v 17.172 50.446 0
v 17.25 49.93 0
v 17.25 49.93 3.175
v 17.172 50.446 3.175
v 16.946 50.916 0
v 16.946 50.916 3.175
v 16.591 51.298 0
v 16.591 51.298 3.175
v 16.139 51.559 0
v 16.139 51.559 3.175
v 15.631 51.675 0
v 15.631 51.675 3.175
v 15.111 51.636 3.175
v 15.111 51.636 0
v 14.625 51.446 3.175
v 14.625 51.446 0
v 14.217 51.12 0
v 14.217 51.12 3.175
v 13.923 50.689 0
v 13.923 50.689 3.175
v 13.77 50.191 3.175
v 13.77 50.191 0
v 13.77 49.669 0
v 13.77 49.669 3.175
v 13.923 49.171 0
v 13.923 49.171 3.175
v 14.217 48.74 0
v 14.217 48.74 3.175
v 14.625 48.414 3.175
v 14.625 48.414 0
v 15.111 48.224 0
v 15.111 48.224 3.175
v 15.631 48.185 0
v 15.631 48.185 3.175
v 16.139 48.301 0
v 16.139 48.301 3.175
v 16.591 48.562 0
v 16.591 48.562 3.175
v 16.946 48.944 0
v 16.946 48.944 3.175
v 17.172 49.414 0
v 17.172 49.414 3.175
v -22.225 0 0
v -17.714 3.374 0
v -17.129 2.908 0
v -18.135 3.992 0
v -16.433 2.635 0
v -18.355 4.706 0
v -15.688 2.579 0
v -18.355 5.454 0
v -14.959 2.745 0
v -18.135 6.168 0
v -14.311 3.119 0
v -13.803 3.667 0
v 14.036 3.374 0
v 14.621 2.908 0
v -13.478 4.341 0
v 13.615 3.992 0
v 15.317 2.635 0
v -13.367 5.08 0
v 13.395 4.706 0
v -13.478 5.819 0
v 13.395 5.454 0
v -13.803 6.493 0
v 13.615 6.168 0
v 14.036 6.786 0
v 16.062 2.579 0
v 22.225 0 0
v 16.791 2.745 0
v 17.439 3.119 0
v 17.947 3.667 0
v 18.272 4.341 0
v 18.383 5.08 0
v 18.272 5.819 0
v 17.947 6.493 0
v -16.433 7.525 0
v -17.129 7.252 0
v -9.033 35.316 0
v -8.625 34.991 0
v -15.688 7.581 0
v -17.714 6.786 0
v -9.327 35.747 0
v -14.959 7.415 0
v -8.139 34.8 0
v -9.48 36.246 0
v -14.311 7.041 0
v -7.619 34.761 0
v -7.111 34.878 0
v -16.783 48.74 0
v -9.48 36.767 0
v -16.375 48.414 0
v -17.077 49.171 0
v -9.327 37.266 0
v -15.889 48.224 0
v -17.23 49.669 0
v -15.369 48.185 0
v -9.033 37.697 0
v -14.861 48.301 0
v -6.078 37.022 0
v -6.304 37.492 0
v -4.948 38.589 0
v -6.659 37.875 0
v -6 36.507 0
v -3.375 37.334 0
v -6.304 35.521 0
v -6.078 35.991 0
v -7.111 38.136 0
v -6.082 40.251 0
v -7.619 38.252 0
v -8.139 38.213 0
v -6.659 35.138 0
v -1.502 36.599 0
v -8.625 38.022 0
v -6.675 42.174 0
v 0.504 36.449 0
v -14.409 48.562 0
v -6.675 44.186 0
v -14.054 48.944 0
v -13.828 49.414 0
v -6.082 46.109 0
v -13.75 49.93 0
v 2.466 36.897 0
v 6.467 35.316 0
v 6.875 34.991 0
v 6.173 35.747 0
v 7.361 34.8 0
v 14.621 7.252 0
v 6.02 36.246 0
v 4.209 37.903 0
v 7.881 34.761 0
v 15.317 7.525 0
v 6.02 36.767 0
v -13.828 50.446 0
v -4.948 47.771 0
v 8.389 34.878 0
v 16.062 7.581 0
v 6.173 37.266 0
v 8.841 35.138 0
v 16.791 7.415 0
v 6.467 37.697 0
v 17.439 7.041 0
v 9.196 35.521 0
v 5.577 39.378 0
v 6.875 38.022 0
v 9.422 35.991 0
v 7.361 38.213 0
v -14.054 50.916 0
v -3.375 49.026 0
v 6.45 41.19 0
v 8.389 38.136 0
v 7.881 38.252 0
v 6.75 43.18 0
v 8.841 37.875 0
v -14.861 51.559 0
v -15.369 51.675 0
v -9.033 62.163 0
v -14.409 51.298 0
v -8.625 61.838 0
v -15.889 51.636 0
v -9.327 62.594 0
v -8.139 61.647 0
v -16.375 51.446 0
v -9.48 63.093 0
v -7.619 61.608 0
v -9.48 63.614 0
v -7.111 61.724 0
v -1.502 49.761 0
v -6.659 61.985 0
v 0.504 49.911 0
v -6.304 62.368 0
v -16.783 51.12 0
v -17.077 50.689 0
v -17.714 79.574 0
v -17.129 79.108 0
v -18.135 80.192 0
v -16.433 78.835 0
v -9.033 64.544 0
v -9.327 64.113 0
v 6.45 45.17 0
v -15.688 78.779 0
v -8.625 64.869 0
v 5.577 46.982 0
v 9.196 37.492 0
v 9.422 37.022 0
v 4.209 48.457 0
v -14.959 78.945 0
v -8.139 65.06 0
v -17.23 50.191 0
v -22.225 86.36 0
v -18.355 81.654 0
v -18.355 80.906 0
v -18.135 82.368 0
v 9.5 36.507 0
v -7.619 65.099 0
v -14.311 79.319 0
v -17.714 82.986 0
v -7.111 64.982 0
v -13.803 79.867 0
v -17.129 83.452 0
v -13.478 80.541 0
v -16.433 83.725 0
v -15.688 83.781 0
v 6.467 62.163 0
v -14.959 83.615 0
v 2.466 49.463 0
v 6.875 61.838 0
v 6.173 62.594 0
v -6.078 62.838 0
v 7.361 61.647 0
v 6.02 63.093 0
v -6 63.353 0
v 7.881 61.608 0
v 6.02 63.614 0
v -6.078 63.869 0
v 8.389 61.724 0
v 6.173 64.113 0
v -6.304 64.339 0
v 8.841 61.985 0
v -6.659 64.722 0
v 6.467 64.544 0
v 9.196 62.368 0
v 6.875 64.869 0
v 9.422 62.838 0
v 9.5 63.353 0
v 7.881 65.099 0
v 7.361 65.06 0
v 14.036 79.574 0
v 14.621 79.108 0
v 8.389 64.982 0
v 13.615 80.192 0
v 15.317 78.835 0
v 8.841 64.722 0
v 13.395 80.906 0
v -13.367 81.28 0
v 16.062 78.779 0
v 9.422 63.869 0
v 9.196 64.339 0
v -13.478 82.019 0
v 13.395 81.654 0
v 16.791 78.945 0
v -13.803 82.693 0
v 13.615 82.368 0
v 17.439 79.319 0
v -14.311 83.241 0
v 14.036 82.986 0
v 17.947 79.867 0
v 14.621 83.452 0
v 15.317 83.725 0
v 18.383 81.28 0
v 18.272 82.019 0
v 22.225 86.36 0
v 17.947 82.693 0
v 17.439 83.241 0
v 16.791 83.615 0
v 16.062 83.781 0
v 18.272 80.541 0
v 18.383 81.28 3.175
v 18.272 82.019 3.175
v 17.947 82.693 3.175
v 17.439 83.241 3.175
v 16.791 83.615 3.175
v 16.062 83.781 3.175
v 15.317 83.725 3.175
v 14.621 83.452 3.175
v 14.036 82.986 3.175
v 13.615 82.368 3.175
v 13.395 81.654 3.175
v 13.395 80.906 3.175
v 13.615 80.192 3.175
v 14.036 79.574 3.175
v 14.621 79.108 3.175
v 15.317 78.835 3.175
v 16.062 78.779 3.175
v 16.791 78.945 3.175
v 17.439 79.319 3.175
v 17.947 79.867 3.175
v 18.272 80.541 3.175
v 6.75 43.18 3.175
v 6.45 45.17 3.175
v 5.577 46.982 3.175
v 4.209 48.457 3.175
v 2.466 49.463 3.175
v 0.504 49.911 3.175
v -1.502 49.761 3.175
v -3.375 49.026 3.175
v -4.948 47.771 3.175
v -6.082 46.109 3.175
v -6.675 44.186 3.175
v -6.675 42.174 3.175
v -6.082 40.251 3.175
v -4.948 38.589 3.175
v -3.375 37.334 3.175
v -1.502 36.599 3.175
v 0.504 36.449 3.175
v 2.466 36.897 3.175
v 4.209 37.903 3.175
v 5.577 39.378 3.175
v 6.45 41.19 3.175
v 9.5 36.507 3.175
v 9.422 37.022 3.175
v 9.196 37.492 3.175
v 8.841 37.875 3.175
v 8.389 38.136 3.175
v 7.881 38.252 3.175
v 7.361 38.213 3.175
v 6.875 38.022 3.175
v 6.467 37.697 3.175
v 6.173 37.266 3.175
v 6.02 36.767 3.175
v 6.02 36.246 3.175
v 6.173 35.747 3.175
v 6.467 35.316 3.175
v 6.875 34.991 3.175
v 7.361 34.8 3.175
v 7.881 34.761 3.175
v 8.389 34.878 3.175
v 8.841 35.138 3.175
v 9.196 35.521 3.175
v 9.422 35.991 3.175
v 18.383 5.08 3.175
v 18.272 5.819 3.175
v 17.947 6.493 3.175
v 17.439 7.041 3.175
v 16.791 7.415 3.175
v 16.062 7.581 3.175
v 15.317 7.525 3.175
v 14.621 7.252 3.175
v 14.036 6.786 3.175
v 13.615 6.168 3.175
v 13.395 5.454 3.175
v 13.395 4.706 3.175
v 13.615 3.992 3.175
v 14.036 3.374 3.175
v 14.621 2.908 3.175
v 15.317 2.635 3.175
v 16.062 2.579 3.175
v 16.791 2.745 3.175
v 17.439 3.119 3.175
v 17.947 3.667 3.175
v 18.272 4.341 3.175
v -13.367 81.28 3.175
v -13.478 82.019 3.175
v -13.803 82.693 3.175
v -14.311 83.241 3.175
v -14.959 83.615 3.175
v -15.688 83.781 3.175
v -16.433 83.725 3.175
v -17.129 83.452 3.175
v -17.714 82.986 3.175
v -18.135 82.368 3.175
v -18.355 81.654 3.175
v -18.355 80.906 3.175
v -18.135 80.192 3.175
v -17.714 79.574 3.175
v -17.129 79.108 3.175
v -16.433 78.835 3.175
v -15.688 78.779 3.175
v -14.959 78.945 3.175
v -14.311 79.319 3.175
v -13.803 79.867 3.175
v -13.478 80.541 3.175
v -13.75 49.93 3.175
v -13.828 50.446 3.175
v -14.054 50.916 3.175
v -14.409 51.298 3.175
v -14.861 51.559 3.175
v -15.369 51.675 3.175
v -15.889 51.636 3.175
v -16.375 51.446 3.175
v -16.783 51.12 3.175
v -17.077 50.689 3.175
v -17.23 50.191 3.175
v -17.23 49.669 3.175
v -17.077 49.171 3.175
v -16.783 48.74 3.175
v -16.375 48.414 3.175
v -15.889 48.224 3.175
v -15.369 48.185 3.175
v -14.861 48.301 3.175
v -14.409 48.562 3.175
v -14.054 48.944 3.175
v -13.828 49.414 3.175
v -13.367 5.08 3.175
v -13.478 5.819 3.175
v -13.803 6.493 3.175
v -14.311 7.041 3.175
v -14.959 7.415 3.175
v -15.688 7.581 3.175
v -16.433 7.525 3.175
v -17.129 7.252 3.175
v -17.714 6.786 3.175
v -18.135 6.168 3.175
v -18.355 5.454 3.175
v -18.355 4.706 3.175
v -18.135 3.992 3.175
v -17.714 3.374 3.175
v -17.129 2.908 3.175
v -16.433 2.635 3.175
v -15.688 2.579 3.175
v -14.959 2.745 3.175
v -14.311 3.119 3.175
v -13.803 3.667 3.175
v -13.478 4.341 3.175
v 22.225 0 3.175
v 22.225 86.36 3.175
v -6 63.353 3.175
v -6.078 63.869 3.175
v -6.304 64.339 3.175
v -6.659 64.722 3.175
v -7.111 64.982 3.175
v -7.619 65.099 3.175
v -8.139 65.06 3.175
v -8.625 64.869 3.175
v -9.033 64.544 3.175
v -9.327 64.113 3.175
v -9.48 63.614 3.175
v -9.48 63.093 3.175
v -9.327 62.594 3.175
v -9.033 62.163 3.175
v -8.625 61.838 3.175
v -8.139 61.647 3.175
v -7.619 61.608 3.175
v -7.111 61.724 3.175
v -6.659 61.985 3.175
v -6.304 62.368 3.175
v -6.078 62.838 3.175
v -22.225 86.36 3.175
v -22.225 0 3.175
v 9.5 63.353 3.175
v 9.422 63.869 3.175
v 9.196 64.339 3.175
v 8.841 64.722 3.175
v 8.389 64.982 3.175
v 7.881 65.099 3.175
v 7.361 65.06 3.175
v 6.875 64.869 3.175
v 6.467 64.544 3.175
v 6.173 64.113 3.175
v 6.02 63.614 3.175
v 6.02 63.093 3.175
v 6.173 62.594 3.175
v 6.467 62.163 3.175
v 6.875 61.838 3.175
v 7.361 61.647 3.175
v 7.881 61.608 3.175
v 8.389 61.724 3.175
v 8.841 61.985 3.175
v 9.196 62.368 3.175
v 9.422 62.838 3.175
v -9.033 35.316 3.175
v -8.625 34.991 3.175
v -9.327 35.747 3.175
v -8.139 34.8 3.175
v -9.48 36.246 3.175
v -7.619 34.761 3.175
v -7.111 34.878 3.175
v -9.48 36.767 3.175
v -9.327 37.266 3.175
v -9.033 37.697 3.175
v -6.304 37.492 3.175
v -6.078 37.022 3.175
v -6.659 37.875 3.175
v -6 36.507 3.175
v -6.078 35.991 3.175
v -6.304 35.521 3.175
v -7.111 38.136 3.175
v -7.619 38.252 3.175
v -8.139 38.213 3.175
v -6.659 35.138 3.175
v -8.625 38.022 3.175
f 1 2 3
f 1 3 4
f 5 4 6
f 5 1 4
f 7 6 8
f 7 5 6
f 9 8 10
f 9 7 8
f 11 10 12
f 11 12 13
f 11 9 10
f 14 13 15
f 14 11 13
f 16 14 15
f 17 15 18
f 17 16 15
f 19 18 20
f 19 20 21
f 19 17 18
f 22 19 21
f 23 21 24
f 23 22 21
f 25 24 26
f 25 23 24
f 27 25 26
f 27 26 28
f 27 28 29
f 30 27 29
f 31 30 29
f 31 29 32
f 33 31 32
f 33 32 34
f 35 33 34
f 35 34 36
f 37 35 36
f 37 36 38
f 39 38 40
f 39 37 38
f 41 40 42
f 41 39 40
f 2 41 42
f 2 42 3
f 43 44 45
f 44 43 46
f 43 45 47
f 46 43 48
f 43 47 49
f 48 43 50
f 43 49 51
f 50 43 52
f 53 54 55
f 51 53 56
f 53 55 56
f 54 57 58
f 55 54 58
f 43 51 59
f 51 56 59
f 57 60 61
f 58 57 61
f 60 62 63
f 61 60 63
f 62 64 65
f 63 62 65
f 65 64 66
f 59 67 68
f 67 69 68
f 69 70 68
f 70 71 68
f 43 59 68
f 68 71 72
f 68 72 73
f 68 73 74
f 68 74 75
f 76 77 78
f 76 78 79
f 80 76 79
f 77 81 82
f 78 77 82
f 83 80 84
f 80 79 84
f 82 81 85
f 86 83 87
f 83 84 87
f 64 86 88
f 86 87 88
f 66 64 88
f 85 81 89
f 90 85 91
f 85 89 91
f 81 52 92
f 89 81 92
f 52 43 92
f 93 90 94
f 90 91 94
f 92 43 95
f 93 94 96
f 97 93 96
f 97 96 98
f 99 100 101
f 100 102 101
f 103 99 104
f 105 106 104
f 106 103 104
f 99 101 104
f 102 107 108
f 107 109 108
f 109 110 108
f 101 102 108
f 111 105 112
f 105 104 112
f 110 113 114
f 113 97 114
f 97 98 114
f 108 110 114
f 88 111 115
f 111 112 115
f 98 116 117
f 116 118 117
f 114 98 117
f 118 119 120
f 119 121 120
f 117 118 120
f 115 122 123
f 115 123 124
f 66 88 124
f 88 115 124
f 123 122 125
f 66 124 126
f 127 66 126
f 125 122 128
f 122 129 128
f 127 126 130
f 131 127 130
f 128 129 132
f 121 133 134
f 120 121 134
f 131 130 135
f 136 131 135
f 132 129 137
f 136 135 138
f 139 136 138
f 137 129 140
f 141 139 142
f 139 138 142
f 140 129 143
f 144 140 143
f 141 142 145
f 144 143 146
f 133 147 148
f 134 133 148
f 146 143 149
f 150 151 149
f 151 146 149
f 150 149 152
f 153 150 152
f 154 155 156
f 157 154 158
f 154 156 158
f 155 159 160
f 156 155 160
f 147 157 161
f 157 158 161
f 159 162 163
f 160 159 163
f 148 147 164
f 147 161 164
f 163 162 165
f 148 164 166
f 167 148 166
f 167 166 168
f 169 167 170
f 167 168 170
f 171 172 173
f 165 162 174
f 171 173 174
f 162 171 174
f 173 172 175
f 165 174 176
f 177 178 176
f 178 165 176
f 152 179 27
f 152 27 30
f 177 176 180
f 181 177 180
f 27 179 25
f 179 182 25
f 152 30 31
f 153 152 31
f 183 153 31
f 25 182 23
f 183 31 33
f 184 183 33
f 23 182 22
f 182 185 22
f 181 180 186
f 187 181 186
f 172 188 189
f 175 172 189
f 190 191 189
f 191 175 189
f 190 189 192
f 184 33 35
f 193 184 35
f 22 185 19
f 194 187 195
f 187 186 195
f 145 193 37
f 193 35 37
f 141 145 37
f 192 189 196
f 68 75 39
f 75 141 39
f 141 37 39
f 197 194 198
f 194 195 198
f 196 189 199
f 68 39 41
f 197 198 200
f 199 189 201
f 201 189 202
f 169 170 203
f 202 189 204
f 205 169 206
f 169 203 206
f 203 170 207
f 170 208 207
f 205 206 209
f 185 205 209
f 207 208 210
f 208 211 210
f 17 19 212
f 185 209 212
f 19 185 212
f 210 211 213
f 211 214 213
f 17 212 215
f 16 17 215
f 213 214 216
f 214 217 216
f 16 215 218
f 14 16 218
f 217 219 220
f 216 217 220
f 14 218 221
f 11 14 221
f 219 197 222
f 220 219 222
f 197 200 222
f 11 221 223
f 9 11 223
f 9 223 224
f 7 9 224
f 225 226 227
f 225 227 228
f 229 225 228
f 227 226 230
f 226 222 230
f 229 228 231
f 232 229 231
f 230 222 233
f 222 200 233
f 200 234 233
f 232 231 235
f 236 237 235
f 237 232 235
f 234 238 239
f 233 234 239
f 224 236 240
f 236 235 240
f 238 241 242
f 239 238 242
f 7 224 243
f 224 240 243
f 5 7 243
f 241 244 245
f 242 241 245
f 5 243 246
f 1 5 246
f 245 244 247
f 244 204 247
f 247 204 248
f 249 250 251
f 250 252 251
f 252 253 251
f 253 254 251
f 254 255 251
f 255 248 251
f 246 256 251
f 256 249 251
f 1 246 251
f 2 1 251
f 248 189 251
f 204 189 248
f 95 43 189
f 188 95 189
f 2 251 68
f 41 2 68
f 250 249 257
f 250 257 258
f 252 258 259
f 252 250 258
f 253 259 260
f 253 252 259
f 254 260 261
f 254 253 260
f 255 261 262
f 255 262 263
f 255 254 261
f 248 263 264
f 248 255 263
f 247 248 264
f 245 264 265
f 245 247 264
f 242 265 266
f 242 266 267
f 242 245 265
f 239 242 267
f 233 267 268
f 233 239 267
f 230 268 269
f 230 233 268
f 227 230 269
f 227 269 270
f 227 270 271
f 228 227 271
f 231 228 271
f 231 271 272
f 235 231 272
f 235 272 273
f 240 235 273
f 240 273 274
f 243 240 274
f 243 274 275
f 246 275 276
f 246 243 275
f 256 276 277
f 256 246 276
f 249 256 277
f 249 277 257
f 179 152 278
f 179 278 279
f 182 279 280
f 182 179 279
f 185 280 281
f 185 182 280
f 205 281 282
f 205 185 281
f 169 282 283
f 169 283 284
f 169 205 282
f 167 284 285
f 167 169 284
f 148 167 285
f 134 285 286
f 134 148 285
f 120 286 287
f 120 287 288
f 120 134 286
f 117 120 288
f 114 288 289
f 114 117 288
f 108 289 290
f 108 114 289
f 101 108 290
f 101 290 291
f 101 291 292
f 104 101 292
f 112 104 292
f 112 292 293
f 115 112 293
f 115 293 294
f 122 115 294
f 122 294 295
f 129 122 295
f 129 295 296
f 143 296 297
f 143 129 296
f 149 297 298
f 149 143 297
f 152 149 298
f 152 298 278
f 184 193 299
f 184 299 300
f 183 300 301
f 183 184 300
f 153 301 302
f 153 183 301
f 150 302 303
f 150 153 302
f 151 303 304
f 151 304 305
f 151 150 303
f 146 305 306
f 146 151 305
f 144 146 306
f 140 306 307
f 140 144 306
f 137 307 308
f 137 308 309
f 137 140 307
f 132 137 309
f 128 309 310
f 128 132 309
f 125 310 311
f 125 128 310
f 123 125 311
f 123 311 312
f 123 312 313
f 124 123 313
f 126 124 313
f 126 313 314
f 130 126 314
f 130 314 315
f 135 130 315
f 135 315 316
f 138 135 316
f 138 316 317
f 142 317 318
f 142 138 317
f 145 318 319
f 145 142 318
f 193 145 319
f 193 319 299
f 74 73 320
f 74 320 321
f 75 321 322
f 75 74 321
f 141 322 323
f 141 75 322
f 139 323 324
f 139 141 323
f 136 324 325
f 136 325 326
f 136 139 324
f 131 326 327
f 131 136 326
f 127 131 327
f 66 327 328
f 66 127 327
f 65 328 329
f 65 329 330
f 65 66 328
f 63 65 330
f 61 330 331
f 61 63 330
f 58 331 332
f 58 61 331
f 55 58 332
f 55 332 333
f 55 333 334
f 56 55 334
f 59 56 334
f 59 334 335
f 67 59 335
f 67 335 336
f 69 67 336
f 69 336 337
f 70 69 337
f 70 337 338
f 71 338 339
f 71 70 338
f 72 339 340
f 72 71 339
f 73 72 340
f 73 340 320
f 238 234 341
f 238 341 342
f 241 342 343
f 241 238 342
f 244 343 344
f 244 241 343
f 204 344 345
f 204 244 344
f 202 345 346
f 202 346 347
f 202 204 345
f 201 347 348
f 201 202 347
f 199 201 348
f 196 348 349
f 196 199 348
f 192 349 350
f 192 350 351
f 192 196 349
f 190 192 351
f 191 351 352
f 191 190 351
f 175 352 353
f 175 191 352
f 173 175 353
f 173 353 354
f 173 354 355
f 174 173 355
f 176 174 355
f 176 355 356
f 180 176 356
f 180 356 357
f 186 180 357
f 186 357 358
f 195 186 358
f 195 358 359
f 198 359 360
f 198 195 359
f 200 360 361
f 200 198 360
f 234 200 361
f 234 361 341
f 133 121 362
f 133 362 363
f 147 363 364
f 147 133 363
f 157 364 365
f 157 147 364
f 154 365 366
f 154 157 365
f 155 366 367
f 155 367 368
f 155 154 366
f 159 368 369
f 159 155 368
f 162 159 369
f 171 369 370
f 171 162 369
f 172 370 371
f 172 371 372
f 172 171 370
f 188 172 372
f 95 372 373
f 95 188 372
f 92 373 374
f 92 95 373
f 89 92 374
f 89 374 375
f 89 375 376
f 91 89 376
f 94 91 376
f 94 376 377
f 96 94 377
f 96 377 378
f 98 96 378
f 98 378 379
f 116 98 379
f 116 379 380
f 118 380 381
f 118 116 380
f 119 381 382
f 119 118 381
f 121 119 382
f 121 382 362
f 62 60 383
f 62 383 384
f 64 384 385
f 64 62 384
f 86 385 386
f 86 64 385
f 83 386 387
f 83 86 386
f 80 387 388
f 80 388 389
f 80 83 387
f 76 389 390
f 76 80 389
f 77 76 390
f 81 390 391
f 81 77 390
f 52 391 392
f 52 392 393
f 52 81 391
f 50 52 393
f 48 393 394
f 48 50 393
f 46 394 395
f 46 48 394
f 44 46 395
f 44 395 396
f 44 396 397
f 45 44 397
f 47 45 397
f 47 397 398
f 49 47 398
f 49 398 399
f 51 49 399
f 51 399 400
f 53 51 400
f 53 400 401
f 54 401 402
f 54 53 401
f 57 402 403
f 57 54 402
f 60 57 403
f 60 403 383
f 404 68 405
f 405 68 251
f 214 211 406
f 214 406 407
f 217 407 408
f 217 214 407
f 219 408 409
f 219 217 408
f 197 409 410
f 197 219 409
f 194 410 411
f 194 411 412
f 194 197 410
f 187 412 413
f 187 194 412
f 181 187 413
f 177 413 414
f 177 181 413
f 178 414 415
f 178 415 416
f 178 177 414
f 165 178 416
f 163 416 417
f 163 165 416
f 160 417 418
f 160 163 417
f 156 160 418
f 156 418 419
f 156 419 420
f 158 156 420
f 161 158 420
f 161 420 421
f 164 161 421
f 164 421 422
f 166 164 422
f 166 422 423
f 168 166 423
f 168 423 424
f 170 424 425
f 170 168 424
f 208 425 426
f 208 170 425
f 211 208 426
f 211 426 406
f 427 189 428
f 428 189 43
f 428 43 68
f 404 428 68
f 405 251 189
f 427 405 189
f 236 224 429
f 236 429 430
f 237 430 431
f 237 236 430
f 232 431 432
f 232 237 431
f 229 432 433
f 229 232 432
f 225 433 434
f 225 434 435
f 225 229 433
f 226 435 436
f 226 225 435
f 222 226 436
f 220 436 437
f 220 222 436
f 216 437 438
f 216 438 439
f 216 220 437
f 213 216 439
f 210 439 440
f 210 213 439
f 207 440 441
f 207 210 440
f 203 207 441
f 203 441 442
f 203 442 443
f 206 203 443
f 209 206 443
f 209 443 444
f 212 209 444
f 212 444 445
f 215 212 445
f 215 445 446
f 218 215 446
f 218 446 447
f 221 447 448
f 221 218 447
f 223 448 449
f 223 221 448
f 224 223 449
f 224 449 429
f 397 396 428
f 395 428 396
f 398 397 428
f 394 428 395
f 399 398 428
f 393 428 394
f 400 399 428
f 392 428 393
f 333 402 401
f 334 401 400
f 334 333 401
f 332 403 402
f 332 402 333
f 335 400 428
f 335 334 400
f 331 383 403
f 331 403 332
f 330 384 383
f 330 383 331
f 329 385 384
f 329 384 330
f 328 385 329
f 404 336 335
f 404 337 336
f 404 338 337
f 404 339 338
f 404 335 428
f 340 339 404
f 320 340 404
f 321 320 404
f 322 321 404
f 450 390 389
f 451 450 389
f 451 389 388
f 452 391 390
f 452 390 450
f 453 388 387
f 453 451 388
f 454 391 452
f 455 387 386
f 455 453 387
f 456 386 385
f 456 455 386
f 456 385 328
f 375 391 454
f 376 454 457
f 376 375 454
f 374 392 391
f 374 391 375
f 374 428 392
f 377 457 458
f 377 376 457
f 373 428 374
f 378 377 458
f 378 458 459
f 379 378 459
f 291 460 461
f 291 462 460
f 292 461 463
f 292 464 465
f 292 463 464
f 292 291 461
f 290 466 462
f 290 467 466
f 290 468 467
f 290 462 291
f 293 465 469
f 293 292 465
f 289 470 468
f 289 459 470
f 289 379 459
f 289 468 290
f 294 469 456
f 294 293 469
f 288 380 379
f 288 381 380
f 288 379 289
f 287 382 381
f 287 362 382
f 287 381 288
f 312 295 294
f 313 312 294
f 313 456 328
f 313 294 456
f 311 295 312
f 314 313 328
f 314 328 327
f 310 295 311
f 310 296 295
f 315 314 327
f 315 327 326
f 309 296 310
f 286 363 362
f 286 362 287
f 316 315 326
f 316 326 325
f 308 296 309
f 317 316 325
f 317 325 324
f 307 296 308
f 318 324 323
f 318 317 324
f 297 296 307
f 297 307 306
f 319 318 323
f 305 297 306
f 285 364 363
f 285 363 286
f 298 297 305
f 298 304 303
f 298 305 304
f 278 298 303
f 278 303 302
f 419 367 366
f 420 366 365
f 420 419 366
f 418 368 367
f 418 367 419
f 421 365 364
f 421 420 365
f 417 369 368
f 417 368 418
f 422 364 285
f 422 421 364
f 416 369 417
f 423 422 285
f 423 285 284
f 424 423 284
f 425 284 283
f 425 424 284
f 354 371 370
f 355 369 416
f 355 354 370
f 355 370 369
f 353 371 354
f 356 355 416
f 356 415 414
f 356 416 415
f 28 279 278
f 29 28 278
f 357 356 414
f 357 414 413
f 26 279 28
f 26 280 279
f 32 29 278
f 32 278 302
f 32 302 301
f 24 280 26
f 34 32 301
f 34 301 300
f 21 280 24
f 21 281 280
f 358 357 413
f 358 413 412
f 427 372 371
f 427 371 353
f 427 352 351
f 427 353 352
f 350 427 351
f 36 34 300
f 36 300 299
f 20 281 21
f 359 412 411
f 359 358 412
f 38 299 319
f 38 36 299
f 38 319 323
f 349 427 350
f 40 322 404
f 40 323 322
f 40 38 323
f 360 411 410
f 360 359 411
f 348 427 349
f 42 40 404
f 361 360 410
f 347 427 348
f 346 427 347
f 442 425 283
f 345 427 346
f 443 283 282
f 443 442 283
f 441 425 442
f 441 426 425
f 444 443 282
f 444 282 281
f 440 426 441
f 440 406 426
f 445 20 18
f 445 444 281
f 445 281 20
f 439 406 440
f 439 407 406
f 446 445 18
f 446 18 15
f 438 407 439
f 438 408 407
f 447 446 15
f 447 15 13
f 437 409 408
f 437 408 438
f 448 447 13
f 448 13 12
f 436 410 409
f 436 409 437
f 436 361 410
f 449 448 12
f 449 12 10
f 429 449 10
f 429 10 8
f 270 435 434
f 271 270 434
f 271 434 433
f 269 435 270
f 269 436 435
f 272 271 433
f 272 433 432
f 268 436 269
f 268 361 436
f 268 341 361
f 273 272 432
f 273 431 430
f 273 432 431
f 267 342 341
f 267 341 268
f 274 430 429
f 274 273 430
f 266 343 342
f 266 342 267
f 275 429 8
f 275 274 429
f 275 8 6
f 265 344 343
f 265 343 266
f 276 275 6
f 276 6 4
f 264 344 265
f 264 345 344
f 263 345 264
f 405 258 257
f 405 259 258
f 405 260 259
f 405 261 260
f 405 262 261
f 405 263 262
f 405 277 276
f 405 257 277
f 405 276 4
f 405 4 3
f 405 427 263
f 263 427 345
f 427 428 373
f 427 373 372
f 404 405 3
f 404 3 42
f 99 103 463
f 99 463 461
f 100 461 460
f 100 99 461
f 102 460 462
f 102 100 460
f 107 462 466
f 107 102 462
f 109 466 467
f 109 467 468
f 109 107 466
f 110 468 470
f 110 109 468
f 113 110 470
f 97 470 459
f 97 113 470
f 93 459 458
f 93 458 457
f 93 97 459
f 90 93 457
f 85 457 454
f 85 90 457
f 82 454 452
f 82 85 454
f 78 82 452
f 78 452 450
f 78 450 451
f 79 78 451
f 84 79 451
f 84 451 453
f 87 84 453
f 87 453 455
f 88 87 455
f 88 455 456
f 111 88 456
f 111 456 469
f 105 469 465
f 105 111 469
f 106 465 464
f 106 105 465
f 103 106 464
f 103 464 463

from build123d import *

# Parameters (mm, degrees)
SKETCH_1_R      = 1.75
SKETCH_1_R_2    = 6.75
SKETCH_1_R_3    = 2.50825
EXTRUDE_1_DEPTH = 3.175


with BuildPart() as part:
    # Эскиз1 → Бобышка-Вытянуть1 (new body)
    with BuildSketch(Plane.XY):
        Polygon((22.225, 86.36), (-22.225, 86.36), (-22.225, 35.56), (-22.225, 0), (22.225, 0), (22.225, 35.56), align=None)
        with Locations((-7.75, 63.353393759)):
            Circle(SKETCH_1_R, mode=Mode.SUBTRACT)
        with Locations((-15.5, 49.93)):
            Circle(SKETCH_1_R, mode=Mode.SUBTRACT)
        with Locations((-7.75, 36.506606241)):
            Circle(SKETCH_1_R, mode=Mode.SUBTRACT)
        with Locations((7.75, 36.506606241)):
            Circle(SKETCH_1_R, mode=Mode.SUBTRACT)
        with Locations((15.5, 49.93)):
            Circle(SKETCH_1_R, mode=Mode.SUBTRACT)
        with Locations((7.75, 63.353393759)):
            Circle(SKETCH_1_R, mode=Mode.SUBTRACT)
        with Locations((0, 43.18)):
            Circle(SKETCH_1_R_2, mode=Mode.SUBTRACT)
        with Locations((15.875, 81.28)):
            Circle(SKETCH_1_R_3, mode=Mode.SUBTRACT)
        with Locations((-15.875, 81.28)):
            Circle(SKETCH_1_R_3, mode=Mode.SUBTRACT)
        with Locations((15.875, 5.08)):
            Circle(SKETCH_1_R_3, mode=Mode.SUBTRACT)
        with Locations((-15.875, 5.08)):
            Circle(SKETCH_1_R_3, mode=Mode.SUBTRACT)
    extrude(amount=EXTRUDE_1_DEPTH)


solid = part.part
